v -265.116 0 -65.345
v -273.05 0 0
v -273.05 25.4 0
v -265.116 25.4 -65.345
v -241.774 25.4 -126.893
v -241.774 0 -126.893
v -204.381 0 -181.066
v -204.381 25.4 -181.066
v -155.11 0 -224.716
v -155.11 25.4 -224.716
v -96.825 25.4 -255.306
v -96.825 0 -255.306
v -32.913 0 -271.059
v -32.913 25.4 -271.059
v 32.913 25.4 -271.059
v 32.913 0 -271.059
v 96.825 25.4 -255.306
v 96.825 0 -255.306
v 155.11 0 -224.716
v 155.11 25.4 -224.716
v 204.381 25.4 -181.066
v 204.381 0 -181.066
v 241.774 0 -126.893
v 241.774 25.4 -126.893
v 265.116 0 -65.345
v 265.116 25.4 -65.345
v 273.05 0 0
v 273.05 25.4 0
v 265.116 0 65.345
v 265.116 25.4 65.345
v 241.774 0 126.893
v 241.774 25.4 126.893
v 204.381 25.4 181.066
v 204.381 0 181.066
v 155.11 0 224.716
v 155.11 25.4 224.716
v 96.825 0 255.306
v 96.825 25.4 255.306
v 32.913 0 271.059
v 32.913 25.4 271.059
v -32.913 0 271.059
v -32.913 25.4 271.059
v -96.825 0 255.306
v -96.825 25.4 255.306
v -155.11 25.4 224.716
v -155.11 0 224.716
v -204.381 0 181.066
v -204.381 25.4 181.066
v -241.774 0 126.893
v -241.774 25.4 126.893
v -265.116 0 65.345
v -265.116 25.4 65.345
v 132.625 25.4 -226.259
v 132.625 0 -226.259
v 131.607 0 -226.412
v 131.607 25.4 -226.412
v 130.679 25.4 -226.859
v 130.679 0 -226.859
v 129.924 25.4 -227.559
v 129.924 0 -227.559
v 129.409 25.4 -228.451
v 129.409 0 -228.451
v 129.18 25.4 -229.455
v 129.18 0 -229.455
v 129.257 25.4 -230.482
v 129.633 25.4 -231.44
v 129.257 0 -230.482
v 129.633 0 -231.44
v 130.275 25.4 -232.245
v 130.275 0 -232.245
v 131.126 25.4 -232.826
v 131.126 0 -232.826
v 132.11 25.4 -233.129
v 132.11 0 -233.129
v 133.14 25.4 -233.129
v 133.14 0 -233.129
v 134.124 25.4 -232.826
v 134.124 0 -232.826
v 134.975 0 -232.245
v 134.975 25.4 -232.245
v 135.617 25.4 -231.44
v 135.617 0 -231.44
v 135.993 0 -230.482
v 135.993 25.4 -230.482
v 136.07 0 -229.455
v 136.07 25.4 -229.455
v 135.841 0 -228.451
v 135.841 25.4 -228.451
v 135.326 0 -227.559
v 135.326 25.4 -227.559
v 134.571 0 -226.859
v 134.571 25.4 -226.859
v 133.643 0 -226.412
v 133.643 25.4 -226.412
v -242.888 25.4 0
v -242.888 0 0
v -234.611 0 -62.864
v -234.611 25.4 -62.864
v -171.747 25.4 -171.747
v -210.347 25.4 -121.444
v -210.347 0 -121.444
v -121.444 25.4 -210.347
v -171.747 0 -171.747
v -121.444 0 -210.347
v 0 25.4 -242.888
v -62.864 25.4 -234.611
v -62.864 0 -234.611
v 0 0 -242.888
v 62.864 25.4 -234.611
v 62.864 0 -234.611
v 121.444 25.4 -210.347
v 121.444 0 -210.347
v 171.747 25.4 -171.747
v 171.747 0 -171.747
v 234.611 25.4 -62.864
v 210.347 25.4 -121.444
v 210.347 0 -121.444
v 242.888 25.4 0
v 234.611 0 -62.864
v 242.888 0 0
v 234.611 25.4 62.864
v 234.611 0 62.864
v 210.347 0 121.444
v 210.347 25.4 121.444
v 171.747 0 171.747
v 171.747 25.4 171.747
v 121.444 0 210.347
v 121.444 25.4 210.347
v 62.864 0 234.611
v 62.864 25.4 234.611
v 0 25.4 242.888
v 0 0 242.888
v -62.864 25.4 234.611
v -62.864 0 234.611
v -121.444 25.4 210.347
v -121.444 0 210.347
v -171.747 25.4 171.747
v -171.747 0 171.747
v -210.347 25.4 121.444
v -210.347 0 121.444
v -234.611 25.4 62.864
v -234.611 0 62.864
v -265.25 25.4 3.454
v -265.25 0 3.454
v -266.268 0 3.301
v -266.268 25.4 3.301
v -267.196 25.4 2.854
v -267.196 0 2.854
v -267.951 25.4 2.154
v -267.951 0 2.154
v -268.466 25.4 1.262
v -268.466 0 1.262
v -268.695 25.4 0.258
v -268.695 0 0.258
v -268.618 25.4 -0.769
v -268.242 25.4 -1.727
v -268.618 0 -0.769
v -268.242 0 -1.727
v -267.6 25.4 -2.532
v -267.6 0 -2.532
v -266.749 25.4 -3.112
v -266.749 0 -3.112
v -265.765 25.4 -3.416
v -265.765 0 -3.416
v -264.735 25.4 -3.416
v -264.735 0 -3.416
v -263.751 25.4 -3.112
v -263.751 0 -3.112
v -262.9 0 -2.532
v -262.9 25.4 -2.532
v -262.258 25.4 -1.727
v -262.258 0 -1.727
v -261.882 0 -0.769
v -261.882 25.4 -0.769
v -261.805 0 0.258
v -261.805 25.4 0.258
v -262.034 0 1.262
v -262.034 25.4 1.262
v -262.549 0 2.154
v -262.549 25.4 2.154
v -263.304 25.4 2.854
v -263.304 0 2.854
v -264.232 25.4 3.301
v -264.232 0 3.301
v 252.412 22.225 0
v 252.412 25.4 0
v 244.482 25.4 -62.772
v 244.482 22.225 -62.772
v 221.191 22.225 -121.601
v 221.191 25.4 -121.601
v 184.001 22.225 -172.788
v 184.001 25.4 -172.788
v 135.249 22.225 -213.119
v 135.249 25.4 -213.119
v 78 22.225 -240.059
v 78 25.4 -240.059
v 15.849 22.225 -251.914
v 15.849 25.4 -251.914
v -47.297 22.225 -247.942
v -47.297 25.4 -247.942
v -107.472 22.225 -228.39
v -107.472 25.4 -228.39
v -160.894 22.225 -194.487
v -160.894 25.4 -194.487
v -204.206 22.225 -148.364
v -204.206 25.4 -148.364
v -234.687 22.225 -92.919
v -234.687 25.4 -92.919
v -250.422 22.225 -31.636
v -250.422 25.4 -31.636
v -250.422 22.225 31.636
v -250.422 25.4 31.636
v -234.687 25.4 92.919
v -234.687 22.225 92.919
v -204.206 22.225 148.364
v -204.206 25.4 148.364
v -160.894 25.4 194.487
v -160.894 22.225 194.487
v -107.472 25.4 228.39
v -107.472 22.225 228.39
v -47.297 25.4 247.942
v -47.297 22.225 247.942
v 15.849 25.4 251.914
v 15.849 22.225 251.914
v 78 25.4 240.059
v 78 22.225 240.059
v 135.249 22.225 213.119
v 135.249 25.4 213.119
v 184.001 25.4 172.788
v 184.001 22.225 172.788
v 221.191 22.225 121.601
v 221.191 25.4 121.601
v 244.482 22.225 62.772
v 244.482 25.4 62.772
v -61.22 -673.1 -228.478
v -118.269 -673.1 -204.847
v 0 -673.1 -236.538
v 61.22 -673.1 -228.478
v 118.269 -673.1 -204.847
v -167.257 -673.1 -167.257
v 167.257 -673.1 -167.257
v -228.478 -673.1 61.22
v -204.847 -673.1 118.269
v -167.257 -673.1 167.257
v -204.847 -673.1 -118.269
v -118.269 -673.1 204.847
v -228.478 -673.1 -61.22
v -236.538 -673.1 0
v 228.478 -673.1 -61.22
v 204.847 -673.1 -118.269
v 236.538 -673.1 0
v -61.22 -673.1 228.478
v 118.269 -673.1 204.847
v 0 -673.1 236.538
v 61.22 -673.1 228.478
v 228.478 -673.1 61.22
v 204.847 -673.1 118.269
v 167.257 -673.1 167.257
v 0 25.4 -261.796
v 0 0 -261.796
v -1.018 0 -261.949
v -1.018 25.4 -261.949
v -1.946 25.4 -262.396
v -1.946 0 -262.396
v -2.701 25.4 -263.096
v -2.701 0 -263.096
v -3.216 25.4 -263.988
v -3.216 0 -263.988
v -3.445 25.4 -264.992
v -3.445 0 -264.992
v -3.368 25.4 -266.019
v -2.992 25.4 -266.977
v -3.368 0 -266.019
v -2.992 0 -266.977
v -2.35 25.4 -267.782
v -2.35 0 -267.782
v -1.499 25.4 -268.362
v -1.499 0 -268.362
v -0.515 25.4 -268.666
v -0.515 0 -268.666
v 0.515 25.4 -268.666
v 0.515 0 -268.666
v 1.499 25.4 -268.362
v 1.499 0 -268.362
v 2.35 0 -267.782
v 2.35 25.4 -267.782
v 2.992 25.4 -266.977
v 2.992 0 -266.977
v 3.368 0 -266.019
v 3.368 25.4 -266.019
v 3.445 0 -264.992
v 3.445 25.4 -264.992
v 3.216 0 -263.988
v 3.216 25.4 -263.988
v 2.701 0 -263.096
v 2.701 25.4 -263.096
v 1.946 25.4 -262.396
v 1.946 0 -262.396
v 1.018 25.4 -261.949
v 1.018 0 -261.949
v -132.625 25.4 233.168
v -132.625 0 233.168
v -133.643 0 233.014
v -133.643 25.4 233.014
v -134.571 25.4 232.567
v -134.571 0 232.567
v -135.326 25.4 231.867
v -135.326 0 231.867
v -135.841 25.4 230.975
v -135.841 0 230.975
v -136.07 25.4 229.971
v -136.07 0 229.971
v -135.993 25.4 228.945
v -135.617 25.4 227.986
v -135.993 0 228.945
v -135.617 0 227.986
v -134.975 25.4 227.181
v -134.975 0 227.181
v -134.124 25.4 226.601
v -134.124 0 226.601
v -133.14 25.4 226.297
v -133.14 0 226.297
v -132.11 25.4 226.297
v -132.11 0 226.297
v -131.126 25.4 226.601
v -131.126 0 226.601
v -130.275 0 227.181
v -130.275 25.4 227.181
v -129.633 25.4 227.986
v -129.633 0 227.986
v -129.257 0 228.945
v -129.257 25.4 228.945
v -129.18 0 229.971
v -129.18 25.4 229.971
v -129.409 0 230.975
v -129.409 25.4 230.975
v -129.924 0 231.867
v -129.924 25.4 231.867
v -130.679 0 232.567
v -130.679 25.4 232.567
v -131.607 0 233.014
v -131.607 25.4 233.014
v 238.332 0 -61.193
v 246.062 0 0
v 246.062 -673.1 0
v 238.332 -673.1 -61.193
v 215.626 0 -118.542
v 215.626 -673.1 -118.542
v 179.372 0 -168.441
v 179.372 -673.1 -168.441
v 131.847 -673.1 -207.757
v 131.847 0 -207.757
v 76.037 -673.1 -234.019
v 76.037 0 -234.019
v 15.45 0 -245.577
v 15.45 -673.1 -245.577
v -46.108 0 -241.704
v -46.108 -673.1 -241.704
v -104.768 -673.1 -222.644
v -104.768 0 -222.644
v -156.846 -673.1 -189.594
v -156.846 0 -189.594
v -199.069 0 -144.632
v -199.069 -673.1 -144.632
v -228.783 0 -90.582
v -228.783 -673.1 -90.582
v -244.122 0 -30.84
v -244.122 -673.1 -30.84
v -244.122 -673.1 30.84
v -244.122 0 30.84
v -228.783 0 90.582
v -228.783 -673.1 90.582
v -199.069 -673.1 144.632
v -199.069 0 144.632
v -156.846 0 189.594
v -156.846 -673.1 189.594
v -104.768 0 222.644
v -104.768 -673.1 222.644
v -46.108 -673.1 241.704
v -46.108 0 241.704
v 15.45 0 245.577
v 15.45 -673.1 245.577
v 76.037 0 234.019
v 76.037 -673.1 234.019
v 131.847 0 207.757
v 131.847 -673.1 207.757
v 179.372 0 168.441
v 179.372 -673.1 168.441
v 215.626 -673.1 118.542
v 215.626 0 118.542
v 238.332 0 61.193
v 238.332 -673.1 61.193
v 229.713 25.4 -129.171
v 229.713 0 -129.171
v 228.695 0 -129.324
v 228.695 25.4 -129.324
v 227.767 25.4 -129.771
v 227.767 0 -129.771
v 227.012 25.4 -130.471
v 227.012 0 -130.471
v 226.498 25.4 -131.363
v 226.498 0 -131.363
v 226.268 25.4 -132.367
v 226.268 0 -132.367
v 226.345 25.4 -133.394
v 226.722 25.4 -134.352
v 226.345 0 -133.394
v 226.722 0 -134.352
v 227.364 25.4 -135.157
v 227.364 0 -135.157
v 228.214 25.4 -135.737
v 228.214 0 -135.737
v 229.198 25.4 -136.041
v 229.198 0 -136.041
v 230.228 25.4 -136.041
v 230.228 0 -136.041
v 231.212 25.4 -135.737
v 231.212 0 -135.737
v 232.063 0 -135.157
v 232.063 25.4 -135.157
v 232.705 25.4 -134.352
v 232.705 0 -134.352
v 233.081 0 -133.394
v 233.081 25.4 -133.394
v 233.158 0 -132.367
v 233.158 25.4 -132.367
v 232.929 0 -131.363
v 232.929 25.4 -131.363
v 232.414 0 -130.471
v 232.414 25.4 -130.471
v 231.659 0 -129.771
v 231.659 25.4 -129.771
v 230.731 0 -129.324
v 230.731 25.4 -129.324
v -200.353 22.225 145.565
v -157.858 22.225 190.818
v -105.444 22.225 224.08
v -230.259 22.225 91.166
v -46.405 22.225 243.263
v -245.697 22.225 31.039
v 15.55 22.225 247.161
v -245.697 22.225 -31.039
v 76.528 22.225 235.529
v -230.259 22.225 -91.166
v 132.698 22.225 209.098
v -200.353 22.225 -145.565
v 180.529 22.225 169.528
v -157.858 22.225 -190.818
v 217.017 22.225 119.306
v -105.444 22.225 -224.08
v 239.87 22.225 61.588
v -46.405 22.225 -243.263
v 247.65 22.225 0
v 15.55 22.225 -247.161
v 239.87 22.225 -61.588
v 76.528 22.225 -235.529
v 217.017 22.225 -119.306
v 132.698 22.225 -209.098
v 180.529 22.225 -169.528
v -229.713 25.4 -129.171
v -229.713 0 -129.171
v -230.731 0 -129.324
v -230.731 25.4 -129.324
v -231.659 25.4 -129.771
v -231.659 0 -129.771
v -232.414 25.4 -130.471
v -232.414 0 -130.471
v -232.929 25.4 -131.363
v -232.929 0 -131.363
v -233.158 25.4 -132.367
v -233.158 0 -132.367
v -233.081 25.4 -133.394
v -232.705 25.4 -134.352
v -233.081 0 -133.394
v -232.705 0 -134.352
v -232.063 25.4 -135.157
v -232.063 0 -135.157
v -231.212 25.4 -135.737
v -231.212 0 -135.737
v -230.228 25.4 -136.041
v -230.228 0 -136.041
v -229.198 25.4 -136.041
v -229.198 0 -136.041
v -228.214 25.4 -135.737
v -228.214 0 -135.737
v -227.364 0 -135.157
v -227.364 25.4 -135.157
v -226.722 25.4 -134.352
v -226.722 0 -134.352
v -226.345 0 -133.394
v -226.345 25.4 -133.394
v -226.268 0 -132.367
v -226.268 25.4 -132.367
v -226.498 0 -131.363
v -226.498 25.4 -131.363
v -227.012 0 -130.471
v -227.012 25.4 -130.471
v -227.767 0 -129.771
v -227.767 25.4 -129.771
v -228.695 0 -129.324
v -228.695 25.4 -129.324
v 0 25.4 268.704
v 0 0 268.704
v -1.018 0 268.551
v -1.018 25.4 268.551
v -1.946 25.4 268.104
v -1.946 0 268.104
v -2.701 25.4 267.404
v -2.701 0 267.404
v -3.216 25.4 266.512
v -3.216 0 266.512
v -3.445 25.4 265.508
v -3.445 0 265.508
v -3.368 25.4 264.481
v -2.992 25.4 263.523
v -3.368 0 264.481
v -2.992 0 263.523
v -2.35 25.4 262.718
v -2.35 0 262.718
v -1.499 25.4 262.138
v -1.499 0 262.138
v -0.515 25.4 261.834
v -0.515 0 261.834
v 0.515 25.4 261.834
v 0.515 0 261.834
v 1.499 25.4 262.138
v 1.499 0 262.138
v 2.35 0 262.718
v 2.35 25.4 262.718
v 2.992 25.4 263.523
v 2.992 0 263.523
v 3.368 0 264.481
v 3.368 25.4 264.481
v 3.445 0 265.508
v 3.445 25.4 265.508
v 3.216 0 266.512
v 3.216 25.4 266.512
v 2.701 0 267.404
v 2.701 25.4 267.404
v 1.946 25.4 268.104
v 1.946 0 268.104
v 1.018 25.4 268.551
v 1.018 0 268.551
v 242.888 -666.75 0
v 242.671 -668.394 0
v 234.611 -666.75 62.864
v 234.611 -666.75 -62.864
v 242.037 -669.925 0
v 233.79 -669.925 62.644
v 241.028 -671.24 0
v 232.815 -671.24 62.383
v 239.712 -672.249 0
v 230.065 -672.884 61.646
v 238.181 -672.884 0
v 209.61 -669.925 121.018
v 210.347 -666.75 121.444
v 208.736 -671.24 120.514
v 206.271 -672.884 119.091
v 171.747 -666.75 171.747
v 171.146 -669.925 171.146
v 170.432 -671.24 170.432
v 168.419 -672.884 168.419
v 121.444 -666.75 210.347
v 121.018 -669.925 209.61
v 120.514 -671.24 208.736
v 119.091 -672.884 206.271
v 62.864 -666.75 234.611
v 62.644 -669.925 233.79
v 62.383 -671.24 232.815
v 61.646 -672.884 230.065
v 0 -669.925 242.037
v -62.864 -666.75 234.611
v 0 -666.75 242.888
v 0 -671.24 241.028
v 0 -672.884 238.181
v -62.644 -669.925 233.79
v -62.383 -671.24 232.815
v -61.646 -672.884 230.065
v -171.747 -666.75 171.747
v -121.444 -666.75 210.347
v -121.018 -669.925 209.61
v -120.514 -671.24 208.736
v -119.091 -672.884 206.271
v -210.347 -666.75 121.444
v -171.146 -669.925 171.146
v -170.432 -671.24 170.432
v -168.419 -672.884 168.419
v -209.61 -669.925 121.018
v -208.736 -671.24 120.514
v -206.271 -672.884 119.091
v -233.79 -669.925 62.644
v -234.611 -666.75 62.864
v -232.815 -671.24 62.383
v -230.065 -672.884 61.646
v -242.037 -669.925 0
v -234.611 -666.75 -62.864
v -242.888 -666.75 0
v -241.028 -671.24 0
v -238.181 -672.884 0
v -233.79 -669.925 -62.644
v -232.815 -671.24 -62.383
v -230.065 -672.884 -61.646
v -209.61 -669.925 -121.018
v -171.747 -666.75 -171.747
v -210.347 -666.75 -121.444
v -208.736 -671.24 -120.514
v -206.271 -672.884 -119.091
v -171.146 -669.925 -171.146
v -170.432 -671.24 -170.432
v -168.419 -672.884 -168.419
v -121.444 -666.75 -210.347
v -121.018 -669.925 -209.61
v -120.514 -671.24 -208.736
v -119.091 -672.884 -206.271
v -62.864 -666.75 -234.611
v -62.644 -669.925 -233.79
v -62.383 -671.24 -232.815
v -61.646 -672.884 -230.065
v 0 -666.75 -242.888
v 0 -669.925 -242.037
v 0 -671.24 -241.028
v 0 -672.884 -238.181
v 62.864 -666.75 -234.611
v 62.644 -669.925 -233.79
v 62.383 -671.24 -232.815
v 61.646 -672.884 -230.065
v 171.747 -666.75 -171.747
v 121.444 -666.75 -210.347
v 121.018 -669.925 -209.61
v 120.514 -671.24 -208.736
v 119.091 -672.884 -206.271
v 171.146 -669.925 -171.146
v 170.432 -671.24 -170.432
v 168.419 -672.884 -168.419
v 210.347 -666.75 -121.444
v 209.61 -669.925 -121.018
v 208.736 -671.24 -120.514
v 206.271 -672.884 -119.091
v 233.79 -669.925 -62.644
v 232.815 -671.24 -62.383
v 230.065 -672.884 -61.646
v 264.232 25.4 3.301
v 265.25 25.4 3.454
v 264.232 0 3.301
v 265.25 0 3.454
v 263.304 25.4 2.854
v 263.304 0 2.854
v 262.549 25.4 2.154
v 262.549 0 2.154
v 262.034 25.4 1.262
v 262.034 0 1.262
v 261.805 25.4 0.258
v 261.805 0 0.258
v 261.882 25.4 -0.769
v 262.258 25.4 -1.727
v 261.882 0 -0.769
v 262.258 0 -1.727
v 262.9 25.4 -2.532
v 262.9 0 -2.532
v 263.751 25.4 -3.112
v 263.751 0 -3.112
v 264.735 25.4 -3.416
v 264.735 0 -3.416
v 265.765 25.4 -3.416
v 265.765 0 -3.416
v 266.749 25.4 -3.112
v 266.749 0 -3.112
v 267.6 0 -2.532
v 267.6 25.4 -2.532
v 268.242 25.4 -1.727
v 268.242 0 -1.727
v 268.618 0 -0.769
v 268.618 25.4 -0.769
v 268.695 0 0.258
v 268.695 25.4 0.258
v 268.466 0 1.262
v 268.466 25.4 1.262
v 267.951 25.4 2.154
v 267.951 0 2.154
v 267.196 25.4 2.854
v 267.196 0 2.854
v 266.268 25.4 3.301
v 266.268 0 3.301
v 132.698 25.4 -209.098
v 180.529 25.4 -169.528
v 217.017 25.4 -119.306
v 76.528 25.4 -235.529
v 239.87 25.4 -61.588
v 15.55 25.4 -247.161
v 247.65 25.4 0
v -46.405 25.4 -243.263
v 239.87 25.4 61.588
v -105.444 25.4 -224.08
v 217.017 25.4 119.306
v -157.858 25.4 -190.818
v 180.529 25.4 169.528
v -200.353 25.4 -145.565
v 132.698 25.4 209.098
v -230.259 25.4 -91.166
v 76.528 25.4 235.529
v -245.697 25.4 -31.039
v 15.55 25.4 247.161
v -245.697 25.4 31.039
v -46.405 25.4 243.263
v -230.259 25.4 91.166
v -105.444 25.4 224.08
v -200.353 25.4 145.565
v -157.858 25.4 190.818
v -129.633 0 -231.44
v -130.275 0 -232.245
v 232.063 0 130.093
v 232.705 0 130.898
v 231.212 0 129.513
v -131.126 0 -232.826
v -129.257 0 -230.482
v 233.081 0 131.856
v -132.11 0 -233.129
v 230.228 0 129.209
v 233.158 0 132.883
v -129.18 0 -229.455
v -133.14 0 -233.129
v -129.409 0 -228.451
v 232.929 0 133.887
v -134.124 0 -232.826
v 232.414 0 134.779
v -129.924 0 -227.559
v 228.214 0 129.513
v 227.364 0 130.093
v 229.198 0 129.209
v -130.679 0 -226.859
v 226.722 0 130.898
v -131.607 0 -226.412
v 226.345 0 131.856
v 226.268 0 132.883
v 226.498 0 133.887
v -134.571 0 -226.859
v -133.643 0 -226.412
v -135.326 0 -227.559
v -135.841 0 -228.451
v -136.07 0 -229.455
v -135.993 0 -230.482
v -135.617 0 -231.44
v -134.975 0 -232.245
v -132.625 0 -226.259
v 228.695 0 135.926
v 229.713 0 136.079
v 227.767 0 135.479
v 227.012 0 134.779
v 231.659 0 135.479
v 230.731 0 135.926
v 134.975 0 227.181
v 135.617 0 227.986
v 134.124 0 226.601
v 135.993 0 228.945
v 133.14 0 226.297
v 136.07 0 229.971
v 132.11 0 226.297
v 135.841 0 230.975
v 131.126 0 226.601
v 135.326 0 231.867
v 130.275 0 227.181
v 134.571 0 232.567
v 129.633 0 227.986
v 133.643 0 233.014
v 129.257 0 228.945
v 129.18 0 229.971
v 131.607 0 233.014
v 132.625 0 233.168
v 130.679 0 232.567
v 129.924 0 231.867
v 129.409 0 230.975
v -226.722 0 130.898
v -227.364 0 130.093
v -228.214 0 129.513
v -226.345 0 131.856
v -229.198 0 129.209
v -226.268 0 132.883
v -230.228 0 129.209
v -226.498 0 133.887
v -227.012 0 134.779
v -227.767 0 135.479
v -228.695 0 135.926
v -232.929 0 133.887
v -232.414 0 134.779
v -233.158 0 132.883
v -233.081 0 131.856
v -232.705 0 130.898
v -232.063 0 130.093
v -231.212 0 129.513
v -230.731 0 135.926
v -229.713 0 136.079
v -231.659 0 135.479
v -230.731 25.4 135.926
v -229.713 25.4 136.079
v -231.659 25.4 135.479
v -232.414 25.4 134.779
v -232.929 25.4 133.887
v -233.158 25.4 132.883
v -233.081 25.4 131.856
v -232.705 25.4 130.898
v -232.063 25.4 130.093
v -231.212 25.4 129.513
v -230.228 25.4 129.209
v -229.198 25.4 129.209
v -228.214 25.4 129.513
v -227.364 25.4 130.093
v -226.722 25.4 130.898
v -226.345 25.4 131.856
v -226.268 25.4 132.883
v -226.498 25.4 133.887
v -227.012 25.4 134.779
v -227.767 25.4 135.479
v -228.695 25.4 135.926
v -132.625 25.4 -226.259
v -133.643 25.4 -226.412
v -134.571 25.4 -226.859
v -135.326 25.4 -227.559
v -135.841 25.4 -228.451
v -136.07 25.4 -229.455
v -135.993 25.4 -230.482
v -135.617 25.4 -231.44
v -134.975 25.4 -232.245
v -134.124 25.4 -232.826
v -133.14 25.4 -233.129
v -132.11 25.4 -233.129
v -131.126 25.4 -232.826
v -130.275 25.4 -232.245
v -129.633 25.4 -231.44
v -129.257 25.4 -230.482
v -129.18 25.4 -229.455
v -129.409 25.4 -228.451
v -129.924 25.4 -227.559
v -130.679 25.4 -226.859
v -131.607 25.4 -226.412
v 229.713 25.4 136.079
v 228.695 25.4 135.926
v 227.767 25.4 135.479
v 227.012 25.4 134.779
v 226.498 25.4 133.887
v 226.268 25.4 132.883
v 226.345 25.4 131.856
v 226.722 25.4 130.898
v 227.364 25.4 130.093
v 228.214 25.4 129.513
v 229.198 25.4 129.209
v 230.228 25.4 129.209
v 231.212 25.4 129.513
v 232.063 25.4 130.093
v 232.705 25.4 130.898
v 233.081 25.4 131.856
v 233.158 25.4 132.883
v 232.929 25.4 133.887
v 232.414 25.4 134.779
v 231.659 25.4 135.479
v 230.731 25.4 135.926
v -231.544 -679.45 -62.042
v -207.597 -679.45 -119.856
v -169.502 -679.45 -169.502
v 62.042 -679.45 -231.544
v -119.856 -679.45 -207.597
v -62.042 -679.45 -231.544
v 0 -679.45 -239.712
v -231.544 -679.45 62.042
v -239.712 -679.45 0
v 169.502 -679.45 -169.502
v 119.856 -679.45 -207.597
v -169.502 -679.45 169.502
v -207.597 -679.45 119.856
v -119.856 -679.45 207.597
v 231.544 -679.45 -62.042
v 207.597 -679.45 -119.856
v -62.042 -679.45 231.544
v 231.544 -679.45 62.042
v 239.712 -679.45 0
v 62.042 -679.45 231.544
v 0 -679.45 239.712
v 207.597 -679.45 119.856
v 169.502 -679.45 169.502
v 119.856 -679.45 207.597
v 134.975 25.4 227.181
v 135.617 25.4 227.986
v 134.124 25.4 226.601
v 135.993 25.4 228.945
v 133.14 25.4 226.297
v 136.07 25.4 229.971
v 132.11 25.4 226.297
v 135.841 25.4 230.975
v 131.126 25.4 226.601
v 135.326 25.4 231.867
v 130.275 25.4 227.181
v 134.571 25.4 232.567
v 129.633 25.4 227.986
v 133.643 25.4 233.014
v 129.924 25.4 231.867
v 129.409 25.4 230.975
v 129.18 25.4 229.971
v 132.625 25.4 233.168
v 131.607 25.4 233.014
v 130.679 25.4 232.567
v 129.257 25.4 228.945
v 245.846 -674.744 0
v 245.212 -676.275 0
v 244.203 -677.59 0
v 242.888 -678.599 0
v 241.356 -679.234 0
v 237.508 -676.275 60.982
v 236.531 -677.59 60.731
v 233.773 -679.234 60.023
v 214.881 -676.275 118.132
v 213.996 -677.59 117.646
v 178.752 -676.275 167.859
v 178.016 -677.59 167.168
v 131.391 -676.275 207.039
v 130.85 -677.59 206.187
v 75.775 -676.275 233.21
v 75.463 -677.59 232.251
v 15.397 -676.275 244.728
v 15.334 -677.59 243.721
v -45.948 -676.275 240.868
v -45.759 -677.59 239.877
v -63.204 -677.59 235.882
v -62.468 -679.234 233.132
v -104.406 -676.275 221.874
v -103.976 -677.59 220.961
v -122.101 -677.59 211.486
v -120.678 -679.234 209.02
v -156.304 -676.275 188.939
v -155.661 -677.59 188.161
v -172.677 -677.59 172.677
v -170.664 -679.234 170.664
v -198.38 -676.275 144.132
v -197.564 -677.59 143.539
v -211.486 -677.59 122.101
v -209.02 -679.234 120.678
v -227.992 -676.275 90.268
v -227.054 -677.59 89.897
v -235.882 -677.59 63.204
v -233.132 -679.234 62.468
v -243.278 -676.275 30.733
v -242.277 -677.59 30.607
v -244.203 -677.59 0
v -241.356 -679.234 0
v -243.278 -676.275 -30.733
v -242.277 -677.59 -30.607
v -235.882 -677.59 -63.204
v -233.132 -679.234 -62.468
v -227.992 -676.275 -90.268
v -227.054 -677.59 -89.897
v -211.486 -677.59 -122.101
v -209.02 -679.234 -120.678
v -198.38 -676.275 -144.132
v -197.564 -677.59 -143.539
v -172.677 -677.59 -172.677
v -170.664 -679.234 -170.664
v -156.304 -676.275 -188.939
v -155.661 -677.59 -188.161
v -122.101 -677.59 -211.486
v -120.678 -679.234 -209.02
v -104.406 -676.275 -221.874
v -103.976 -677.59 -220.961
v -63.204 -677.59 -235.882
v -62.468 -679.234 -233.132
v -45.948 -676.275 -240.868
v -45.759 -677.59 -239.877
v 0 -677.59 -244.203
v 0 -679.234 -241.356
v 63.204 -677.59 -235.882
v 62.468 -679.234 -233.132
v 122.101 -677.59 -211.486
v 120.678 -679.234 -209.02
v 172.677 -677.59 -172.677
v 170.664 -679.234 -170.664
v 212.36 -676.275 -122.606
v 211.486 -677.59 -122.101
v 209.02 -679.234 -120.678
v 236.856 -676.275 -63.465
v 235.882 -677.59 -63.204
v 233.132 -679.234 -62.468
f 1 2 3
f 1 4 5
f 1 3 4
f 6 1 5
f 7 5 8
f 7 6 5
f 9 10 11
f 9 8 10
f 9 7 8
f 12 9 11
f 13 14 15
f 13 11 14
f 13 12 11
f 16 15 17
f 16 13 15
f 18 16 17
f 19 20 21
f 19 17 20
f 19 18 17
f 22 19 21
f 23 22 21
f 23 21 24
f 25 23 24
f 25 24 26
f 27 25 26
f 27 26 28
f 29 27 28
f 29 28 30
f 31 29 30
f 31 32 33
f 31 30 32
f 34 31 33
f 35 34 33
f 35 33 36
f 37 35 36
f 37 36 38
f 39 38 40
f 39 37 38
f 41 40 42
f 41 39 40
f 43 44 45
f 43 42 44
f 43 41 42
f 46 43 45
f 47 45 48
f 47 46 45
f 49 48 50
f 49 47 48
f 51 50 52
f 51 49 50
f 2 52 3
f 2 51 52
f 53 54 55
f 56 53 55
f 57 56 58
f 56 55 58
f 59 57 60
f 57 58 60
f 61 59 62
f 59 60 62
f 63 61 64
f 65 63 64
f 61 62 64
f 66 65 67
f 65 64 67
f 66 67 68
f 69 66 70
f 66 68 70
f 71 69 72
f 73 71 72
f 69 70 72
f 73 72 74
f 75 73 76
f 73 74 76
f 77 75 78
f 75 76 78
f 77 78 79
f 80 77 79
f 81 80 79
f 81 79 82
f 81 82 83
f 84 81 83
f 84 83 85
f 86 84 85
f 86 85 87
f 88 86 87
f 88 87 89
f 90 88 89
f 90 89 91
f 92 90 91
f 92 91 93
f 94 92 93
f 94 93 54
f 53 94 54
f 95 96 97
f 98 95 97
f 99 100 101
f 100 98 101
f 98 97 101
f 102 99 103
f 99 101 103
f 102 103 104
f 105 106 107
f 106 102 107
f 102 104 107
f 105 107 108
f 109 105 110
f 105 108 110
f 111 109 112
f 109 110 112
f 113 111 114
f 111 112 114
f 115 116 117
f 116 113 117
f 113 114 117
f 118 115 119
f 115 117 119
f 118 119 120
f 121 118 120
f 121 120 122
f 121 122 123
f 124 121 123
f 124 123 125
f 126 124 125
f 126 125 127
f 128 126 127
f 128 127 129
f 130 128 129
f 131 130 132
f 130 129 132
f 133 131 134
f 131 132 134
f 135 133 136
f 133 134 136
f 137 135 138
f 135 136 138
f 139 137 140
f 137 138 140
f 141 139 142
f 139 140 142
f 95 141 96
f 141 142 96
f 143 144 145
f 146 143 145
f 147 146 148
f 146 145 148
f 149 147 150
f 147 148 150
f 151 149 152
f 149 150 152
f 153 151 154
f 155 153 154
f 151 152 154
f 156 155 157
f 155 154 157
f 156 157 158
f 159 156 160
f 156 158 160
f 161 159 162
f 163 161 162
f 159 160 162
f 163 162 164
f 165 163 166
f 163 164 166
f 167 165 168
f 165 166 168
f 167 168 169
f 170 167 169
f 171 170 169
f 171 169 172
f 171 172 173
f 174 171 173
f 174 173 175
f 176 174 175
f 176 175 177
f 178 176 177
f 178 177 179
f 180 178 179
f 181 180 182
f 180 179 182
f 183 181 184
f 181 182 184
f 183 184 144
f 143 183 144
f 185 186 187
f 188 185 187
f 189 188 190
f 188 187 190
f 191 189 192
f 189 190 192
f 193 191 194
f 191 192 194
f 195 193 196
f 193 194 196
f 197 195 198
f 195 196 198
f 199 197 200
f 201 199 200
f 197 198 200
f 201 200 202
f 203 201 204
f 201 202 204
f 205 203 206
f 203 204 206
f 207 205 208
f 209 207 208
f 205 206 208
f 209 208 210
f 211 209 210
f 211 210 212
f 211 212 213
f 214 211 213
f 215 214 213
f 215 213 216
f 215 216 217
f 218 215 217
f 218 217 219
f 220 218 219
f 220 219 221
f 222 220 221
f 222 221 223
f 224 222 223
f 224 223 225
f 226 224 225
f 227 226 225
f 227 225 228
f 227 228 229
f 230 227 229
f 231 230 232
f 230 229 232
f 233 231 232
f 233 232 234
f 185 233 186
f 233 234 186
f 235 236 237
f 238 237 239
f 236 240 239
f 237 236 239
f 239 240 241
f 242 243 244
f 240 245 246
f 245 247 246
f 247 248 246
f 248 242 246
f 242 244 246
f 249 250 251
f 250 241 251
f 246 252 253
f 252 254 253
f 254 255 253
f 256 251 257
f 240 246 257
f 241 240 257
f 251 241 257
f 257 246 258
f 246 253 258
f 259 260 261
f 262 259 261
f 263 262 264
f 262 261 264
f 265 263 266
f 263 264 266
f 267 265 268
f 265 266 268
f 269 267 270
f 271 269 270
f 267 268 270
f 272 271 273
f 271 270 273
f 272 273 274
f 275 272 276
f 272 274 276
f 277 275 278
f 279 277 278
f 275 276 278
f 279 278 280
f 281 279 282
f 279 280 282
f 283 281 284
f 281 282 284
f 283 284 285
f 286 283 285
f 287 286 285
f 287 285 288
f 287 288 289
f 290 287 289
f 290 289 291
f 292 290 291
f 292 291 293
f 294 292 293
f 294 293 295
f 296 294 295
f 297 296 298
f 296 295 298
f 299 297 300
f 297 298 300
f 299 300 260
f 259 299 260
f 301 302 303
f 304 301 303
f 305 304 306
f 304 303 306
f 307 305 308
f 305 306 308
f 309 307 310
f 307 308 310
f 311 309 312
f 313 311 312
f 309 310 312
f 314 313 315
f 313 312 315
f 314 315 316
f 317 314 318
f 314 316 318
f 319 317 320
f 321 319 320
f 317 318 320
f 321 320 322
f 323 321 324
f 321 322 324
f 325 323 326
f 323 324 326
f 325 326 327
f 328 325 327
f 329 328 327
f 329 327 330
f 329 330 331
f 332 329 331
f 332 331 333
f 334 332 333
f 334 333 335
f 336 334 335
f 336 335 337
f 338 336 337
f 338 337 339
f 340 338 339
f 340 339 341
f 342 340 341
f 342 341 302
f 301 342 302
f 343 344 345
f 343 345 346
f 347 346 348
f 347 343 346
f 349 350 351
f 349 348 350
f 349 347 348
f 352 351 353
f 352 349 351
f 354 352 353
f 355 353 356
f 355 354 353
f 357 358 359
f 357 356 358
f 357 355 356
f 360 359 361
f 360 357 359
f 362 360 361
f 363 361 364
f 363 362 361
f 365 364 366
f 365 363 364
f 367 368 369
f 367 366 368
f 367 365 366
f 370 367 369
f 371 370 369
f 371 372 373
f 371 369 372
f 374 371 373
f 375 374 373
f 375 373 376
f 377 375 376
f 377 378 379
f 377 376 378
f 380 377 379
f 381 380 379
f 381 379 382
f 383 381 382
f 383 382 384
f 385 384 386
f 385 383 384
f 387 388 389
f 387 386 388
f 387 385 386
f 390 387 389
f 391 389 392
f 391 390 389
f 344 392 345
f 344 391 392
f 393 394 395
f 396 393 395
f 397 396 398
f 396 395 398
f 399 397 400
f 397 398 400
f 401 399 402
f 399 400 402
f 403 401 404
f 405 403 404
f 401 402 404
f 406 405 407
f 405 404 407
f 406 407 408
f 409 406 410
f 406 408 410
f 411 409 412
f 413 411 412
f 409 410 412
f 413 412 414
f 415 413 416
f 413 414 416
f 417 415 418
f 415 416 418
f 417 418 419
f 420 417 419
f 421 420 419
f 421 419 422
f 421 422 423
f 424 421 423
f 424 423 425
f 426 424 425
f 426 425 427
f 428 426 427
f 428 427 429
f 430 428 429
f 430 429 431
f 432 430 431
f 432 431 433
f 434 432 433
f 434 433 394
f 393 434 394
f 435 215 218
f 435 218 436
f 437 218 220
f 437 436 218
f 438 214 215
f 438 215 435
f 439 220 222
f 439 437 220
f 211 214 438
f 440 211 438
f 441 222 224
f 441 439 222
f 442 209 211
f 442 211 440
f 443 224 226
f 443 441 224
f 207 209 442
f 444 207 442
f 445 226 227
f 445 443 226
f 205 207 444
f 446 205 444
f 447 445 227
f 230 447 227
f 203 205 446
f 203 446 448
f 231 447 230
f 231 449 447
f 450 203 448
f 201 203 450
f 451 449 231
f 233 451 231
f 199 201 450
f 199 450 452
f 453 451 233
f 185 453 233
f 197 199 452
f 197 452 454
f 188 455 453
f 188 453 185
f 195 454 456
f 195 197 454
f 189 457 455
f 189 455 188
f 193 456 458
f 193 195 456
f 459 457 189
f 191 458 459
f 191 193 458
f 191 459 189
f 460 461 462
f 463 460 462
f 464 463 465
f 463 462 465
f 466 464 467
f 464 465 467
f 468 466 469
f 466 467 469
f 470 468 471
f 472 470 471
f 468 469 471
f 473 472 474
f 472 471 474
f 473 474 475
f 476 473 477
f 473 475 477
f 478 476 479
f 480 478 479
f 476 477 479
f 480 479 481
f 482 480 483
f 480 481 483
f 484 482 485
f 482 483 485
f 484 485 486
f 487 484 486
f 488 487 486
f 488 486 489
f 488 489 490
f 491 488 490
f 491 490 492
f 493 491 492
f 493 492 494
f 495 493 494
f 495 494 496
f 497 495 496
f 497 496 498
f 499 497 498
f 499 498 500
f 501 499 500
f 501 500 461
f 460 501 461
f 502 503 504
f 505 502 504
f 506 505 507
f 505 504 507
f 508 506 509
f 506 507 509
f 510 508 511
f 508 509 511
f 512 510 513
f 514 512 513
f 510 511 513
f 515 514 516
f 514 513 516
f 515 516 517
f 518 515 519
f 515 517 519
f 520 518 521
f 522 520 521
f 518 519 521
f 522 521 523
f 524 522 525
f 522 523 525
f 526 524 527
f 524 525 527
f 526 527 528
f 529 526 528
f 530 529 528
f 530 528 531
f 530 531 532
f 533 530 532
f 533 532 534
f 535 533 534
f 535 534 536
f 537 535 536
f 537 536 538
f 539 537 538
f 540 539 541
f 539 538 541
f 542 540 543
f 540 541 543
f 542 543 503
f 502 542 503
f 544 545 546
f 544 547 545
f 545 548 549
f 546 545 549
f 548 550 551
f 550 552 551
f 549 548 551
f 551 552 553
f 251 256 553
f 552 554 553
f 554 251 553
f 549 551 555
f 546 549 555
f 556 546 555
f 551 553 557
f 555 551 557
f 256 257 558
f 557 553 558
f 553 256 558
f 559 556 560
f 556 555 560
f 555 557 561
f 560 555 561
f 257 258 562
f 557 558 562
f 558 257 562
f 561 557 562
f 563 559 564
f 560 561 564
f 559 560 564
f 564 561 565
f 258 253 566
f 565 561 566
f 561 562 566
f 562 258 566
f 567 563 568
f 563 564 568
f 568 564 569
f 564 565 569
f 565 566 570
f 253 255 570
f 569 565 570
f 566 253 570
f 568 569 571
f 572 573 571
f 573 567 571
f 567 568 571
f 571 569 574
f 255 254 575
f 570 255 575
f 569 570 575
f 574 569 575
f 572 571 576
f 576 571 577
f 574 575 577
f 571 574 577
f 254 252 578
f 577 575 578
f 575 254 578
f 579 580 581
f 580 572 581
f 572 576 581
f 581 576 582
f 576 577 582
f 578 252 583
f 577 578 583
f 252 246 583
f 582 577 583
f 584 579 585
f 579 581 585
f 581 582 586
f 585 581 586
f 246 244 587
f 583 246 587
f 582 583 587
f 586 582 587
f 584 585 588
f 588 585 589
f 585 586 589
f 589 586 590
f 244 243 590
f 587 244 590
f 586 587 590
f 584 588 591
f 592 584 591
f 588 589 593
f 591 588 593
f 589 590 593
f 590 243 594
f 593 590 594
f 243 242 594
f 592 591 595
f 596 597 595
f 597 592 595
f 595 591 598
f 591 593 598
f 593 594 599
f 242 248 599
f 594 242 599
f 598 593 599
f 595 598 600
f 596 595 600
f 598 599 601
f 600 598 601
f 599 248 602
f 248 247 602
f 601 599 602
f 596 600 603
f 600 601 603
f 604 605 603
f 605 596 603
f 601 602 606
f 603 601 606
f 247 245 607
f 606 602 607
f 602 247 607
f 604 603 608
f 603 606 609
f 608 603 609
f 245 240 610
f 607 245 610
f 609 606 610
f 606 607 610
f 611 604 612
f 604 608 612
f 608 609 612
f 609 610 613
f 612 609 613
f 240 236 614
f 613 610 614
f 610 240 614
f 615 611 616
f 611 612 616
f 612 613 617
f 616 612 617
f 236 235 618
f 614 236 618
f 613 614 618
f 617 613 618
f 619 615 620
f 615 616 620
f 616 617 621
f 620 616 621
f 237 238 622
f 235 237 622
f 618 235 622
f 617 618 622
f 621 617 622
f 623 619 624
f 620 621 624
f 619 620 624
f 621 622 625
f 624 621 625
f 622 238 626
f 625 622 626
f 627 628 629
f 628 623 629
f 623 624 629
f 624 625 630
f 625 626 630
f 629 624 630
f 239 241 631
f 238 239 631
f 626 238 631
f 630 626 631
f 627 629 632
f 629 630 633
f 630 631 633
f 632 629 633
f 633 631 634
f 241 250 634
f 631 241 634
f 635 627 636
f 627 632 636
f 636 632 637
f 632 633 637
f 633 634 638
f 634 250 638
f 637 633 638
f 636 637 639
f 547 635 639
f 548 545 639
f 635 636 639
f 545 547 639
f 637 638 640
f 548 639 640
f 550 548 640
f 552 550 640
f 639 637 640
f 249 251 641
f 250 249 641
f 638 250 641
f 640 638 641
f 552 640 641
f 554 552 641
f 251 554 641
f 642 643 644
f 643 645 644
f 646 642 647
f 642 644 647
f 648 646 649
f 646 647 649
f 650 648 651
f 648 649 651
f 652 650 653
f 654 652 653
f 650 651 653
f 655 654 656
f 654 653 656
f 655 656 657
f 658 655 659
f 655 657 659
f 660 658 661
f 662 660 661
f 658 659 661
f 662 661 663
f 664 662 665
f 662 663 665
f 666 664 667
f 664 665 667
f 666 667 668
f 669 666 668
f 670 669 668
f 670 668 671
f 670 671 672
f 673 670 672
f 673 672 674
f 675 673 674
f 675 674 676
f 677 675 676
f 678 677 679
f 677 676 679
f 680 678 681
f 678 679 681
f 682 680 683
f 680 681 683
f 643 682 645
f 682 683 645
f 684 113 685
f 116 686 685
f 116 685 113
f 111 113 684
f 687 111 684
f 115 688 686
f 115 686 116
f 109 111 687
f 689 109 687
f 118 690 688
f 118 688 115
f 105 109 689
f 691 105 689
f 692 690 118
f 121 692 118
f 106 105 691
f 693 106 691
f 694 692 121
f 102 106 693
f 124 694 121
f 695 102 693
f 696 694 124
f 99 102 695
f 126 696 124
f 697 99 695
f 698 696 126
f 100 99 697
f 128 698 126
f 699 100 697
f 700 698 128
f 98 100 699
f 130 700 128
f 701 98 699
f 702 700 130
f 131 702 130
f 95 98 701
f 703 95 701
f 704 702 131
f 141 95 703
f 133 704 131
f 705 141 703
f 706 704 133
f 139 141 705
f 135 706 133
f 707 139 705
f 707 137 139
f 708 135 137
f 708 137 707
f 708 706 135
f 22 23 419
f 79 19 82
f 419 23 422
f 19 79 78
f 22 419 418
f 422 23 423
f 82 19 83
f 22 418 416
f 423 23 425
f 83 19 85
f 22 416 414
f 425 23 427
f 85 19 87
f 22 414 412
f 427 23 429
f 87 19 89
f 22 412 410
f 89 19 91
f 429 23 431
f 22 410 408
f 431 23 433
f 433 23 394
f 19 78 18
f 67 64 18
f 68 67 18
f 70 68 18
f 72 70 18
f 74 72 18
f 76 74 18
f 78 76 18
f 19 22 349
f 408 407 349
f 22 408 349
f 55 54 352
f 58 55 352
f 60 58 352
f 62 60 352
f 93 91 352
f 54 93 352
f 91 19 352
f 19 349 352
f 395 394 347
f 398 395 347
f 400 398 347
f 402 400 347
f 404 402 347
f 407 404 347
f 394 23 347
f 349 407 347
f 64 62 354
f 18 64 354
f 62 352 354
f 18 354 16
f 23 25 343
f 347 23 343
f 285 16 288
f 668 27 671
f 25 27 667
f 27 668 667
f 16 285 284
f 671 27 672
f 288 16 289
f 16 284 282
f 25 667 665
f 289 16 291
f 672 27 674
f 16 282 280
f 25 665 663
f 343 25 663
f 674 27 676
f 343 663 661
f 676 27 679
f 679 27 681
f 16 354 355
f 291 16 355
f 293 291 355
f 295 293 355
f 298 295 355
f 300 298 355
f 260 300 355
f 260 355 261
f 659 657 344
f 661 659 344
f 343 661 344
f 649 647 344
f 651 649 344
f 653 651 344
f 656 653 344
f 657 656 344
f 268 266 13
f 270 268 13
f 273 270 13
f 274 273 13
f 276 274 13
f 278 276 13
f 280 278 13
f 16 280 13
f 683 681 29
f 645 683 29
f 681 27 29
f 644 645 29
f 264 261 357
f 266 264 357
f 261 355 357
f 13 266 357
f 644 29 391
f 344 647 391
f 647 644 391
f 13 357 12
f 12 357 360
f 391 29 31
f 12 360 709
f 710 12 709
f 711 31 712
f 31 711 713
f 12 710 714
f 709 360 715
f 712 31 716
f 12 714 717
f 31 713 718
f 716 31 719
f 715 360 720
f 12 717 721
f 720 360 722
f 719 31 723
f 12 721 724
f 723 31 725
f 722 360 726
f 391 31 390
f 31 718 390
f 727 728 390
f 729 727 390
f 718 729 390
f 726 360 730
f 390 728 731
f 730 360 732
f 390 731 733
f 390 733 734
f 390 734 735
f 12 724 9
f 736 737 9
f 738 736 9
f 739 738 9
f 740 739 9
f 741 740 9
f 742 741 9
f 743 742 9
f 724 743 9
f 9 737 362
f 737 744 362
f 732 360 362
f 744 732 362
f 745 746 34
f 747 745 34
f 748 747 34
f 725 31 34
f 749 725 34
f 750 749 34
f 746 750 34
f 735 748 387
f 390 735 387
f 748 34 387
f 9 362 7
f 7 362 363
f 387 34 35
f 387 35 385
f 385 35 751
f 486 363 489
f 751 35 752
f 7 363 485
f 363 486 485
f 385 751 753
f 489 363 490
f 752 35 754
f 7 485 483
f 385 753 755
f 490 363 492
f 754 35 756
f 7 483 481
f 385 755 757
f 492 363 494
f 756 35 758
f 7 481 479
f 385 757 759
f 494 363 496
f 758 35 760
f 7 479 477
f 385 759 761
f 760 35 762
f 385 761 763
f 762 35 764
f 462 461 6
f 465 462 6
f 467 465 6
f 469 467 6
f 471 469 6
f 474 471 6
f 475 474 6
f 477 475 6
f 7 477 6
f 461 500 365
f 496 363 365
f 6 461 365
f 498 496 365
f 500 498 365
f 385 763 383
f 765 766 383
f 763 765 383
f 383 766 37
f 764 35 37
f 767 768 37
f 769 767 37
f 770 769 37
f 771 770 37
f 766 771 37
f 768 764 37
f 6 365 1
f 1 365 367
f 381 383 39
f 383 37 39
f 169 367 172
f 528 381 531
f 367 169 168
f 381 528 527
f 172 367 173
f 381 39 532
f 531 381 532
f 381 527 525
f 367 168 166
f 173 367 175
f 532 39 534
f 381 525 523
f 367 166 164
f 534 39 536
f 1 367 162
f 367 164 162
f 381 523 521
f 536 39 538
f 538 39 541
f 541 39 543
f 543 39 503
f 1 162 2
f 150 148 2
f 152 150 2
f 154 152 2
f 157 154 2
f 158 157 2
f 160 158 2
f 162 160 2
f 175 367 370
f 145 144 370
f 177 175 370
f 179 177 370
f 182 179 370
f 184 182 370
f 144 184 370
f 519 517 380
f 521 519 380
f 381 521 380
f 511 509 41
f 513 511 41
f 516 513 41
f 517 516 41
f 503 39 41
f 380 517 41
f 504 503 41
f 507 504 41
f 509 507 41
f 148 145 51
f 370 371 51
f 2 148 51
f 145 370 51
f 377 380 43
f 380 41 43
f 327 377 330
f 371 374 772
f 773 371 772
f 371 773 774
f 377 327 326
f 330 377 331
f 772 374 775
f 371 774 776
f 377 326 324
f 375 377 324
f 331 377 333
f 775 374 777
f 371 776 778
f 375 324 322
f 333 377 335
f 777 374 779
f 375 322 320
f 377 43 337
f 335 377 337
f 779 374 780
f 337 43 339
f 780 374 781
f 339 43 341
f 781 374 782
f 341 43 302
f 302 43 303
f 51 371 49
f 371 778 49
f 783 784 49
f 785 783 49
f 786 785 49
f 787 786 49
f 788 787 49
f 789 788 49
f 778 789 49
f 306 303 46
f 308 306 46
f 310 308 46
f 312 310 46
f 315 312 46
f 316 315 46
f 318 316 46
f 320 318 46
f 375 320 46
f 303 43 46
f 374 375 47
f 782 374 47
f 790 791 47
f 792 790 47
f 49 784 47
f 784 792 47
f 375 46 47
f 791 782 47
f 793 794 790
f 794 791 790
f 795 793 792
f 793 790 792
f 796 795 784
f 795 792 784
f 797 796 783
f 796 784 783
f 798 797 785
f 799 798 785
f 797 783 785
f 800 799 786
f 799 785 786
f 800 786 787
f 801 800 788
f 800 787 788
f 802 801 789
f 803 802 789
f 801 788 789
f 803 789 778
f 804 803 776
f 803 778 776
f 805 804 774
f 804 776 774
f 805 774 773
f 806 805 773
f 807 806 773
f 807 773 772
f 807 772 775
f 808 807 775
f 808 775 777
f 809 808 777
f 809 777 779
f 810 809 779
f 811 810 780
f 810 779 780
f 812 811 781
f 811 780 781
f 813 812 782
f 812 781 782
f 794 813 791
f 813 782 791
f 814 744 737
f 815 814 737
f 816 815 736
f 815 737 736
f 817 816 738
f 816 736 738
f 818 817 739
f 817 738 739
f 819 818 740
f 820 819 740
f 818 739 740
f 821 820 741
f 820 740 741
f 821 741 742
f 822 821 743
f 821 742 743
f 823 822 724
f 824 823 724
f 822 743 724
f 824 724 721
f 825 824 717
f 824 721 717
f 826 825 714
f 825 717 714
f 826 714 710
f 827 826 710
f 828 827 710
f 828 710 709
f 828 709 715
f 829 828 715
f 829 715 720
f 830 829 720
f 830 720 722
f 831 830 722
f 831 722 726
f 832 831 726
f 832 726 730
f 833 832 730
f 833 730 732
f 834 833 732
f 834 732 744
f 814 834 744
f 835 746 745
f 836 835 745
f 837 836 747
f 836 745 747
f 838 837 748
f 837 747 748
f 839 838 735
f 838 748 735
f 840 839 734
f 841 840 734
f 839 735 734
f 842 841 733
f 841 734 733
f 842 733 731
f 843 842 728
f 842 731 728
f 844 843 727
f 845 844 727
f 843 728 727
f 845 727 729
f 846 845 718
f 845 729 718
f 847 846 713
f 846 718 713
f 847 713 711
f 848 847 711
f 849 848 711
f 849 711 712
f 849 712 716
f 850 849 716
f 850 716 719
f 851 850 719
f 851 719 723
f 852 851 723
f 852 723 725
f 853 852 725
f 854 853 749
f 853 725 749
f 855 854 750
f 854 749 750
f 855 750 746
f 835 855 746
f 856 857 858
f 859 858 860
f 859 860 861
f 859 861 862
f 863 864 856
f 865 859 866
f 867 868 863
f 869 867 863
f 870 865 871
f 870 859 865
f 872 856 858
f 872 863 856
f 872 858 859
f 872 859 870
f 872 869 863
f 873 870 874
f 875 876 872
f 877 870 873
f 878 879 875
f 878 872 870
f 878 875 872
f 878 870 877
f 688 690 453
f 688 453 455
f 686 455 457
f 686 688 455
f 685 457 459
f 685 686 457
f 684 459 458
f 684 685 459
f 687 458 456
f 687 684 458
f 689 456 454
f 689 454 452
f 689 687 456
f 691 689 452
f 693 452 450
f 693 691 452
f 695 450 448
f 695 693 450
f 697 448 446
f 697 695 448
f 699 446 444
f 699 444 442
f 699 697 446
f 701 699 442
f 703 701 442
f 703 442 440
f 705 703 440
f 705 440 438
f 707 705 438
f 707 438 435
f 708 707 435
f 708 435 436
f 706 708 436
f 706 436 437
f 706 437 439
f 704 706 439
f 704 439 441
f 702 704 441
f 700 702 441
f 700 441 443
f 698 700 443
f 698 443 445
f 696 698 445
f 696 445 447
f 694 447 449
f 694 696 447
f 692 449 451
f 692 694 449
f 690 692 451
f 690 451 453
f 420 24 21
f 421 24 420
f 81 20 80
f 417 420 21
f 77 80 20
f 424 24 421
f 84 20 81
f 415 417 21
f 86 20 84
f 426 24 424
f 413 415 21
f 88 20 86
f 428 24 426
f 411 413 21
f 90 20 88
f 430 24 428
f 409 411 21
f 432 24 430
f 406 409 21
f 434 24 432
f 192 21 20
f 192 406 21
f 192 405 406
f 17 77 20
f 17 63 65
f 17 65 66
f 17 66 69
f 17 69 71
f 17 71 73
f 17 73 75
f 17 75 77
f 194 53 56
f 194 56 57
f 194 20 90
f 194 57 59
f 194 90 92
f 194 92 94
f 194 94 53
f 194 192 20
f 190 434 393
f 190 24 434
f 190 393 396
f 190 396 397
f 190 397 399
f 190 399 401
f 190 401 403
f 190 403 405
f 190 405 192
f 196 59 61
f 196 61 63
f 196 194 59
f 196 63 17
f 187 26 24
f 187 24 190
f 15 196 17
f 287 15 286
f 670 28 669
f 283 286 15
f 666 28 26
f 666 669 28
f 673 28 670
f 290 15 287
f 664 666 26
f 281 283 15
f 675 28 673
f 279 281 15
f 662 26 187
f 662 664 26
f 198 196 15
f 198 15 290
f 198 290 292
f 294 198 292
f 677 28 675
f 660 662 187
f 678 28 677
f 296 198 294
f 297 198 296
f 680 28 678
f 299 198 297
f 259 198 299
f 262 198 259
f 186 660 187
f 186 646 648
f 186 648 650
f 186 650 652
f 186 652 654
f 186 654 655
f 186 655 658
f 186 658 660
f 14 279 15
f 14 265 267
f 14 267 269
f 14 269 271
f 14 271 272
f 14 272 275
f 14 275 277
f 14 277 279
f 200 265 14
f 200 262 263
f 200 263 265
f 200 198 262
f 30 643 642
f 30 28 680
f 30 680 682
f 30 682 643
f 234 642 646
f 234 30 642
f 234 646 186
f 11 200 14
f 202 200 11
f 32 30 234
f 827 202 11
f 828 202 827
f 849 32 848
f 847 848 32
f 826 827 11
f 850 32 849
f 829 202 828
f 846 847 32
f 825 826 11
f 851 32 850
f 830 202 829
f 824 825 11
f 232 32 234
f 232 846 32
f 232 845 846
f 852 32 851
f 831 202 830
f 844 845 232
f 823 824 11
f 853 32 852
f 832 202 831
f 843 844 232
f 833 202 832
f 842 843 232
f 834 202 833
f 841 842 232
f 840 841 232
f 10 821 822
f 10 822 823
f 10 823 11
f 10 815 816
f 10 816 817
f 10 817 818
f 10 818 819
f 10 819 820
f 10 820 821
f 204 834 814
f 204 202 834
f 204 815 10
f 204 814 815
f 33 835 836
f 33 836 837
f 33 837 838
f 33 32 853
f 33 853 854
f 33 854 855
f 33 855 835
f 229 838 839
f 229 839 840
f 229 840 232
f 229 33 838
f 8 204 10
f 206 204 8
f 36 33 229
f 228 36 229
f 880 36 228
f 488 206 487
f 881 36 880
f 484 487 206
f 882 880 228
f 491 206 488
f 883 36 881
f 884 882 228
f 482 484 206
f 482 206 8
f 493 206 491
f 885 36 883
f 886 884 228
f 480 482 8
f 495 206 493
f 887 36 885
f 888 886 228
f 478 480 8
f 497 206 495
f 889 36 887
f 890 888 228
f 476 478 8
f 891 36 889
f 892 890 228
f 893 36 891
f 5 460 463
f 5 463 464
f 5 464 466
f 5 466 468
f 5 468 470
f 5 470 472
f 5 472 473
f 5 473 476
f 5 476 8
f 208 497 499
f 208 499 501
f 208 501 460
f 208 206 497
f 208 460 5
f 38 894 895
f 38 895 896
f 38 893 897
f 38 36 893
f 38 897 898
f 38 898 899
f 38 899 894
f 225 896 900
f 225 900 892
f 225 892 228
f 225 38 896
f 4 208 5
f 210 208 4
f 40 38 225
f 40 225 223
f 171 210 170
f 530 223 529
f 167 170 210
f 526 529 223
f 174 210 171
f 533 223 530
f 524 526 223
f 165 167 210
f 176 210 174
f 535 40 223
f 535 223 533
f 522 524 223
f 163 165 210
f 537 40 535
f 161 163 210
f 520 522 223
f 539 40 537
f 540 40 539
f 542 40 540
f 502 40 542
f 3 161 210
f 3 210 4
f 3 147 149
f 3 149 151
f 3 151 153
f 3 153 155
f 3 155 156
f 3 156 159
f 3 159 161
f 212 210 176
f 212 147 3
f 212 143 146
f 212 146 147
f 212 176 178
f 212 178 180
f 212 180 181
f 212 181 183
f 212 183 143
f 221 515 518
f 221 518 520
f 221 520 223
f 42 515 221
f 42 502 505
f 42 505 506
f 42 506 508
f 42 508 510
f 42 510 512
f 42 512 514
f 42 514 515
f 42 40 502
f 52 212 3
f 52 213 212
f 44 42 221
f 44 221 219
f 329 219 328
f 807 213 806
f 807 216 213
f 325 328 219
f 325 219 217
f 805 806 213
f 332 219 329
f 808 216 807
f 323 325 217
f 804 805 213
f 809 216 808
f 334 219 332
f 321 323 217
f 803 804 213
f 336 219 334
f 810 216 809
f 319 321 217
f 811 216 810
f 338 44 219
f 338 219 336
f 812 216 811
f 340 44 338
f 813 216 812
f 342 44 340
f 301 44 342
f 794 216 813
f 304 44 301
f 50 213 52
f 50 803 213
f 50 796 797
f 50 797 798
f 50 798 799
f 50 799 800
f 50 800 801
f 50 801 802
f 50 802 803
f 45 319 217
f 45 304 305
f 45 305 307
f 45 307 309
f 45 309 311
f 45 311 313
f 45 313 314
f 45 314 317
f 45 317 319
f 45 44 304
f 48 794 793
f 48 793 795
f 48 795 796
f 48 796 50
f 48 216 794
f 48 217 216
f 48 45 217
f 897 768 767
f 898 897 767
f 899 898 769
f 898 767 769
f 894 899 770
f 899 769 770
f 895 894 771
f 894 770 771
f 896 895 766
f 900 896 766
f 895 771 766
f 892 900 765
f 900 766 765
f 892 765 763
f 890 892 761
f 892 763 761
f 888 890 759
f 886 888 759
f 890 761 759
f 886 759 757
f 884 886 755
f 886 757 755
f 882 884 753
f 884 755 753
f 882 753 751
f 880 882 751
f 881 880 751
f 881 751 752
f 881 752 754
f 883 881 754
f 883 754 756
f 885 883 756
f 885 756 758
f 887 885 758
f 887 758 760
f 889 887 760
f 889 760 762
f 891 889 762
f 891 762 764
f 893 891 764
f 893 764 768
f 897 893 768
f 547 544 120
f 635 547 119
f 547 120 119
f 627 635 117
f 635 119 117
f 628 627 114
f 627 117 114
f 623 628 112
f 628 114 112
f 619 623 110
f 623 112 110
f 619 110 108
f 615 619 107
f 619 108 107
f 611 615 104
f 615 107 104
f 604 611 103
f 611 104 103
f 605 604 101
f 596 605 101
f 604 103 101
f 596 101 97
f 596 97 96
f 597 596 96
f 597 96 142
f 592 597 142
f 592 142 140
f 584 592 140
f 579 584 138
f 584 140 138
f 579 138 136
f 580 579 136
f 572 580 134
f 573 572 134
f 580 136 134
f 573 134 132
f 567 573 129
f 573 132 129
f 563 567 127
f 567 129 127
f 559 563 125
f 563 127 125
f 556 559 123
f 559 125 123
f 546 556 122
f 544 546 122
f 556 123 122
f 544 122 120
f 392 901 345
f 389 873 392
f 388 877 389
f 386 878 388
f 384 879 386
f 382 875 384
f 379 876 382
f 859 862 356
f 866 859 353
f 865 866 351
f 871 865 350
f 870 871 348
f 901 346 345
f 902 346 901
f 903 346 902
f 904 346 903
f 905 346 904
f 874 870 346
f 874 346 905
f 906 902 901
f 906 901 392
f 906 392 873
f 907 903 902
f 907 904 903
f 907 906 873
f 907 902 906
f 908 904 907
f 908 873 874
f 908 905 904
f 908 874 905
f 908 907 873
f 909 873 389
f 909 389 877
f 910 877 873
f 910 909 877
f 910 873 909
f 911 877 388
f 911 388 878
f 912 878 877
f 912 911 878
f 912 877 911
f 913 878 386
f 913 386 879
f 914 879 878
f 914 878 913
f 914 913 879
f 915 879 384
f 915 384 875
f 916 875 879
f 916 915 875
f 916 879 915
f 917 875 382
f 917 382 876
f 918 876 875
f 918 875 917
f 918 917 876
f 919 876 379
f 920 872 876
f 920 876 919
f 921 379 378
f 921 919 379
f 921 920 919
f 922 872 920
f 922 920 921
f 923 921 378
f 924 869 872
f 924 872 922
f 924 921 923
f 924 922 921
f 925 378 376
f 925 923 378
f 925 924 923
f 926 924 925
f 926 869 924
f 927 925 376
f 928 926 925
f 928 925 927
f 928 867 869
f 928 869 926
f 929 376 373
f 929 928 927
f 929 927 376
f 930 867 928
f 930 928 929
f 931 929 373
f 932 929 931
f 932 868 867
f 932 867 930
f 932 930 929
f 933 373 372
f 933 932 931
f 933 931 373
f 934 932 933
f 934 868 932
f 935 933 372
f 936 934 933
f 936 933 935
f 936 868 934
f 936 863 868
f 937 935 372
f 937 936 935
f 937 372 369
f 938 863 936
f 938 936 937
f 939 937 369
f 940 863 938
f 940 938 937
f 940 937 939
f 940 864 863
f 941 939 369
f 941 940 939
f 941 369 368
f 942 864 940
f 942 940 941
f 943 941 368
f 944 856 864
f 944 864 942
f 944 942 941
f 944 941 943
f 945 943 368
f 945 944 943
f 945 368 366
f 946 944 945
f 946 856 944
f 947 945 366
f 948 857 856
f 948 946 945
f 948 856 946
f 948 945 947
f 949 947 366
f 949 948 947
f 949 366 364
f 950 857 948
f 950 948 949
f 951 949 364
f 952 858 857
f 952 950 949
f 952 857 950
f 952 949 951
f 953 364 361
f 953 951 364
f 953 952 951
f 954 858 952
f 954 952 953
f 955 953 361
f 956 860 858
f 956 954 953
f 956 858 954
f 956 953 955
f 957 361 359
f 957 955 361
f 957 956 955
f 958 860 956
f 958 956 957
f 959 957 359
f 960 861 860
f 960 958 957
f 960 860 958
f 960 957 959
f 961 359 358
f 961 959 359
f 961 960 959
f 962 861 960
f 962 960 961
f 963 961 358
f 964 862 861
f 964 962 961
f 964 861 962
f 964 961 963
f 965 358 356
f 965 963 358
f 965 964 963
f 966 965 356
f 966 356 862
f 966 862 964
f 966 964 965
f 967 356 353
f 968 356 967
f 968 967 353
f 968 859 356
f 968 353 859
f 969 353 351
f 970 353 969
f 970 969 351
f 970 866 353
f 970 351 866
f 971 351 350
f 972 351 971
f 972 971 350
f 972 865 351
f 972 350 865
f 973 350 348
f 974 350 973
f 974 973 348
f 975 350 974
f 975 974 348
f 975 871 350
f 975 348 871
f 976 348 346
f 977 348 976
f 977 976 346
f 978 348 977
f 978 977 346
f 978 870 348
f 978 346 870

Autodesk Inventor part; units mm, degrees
ref_plane "YZ Plane" through (0, 0, 0) normal (1, 0, 0) x (0, 1, 0)
ref_plane "XZ Plane" through (0, 0, 0) normal (0, 1, 0) x (-1, 0, 0)
ref_plane "XY Plane" through (0, 0, 0) normal (0, 0, 1) x (1, 0, 0)
sketch "Sketch1" plane through (0, 0, 0) normal (0, 1, 0) x (-1, 0, 0)
  circle A0 centre (0, 0) radius 273.05
  circle A1 centre (0, 0) radius 242.8875
  dimension "d0" = 546.1
  dimension "d1" = 485.775
extrude "Extrusion1" add sketch "Sketch1" along normal blind 25.4
sketch "Sketch2" plane through (0, 25.4, 0) normal (0, 1, 0) x (1, 0, 0)
  circle A0 centre (0, 0) radius 247.65
  circle A1 centre (0, 0) radius 252.4125
  dimension "d4" = 495.3
  dimension "d5" = 504.825
extrude "Extrusion2" cut sketch "Sketch2" against normal blind 3.175
sketch "Sketch3" plane through (0, 25.4, 0) normal (0, 1, 0) x (1, 0, 0)
  line L0 (0, 0) -> (-265.25, 0) construction
  dimension "d8" = 265.25
hole "Hole1" at (-265.25, 25.4, 0) direction (0, -1, 0) diameter 6.9088 end up to surface
pattern_circular "Circular Pattern1" count 12 over 360 about axis through (0, -10, 0) along (0, 1, 0) of "Hole1"
sketch "Sketch4" plane through (0, 0, 0) normal (0, -1, 0) x (1, 0, 0)
  circle A0 centre (0, 0) radius 242.8875
  circle A1 centre (0, 0) radius 246.0625
  dimension "d19" = 485.775
  dimension "d20" = 492.125
extrude "Extrusion3" add sketch "Sketch4" along normal blind 679.45
sketch "Sketch8" plane through (0, -679.45, 0) normal (0, -1, 0) x (1, 0, 0)
  circle A0 centre (0, 0) radius 246.0625
  dimension "d45" = 492.125
extrude "Extrusion6" add sketch "Sketch8" against normal blind 6.35
fillet "Fillet1" radius 6.35 2 edges at (-246.0625, -679.45, 0) (-242.8875, -673.1, 0)
properties part number "vacuum jacket long" material "Aluminum 6061"
